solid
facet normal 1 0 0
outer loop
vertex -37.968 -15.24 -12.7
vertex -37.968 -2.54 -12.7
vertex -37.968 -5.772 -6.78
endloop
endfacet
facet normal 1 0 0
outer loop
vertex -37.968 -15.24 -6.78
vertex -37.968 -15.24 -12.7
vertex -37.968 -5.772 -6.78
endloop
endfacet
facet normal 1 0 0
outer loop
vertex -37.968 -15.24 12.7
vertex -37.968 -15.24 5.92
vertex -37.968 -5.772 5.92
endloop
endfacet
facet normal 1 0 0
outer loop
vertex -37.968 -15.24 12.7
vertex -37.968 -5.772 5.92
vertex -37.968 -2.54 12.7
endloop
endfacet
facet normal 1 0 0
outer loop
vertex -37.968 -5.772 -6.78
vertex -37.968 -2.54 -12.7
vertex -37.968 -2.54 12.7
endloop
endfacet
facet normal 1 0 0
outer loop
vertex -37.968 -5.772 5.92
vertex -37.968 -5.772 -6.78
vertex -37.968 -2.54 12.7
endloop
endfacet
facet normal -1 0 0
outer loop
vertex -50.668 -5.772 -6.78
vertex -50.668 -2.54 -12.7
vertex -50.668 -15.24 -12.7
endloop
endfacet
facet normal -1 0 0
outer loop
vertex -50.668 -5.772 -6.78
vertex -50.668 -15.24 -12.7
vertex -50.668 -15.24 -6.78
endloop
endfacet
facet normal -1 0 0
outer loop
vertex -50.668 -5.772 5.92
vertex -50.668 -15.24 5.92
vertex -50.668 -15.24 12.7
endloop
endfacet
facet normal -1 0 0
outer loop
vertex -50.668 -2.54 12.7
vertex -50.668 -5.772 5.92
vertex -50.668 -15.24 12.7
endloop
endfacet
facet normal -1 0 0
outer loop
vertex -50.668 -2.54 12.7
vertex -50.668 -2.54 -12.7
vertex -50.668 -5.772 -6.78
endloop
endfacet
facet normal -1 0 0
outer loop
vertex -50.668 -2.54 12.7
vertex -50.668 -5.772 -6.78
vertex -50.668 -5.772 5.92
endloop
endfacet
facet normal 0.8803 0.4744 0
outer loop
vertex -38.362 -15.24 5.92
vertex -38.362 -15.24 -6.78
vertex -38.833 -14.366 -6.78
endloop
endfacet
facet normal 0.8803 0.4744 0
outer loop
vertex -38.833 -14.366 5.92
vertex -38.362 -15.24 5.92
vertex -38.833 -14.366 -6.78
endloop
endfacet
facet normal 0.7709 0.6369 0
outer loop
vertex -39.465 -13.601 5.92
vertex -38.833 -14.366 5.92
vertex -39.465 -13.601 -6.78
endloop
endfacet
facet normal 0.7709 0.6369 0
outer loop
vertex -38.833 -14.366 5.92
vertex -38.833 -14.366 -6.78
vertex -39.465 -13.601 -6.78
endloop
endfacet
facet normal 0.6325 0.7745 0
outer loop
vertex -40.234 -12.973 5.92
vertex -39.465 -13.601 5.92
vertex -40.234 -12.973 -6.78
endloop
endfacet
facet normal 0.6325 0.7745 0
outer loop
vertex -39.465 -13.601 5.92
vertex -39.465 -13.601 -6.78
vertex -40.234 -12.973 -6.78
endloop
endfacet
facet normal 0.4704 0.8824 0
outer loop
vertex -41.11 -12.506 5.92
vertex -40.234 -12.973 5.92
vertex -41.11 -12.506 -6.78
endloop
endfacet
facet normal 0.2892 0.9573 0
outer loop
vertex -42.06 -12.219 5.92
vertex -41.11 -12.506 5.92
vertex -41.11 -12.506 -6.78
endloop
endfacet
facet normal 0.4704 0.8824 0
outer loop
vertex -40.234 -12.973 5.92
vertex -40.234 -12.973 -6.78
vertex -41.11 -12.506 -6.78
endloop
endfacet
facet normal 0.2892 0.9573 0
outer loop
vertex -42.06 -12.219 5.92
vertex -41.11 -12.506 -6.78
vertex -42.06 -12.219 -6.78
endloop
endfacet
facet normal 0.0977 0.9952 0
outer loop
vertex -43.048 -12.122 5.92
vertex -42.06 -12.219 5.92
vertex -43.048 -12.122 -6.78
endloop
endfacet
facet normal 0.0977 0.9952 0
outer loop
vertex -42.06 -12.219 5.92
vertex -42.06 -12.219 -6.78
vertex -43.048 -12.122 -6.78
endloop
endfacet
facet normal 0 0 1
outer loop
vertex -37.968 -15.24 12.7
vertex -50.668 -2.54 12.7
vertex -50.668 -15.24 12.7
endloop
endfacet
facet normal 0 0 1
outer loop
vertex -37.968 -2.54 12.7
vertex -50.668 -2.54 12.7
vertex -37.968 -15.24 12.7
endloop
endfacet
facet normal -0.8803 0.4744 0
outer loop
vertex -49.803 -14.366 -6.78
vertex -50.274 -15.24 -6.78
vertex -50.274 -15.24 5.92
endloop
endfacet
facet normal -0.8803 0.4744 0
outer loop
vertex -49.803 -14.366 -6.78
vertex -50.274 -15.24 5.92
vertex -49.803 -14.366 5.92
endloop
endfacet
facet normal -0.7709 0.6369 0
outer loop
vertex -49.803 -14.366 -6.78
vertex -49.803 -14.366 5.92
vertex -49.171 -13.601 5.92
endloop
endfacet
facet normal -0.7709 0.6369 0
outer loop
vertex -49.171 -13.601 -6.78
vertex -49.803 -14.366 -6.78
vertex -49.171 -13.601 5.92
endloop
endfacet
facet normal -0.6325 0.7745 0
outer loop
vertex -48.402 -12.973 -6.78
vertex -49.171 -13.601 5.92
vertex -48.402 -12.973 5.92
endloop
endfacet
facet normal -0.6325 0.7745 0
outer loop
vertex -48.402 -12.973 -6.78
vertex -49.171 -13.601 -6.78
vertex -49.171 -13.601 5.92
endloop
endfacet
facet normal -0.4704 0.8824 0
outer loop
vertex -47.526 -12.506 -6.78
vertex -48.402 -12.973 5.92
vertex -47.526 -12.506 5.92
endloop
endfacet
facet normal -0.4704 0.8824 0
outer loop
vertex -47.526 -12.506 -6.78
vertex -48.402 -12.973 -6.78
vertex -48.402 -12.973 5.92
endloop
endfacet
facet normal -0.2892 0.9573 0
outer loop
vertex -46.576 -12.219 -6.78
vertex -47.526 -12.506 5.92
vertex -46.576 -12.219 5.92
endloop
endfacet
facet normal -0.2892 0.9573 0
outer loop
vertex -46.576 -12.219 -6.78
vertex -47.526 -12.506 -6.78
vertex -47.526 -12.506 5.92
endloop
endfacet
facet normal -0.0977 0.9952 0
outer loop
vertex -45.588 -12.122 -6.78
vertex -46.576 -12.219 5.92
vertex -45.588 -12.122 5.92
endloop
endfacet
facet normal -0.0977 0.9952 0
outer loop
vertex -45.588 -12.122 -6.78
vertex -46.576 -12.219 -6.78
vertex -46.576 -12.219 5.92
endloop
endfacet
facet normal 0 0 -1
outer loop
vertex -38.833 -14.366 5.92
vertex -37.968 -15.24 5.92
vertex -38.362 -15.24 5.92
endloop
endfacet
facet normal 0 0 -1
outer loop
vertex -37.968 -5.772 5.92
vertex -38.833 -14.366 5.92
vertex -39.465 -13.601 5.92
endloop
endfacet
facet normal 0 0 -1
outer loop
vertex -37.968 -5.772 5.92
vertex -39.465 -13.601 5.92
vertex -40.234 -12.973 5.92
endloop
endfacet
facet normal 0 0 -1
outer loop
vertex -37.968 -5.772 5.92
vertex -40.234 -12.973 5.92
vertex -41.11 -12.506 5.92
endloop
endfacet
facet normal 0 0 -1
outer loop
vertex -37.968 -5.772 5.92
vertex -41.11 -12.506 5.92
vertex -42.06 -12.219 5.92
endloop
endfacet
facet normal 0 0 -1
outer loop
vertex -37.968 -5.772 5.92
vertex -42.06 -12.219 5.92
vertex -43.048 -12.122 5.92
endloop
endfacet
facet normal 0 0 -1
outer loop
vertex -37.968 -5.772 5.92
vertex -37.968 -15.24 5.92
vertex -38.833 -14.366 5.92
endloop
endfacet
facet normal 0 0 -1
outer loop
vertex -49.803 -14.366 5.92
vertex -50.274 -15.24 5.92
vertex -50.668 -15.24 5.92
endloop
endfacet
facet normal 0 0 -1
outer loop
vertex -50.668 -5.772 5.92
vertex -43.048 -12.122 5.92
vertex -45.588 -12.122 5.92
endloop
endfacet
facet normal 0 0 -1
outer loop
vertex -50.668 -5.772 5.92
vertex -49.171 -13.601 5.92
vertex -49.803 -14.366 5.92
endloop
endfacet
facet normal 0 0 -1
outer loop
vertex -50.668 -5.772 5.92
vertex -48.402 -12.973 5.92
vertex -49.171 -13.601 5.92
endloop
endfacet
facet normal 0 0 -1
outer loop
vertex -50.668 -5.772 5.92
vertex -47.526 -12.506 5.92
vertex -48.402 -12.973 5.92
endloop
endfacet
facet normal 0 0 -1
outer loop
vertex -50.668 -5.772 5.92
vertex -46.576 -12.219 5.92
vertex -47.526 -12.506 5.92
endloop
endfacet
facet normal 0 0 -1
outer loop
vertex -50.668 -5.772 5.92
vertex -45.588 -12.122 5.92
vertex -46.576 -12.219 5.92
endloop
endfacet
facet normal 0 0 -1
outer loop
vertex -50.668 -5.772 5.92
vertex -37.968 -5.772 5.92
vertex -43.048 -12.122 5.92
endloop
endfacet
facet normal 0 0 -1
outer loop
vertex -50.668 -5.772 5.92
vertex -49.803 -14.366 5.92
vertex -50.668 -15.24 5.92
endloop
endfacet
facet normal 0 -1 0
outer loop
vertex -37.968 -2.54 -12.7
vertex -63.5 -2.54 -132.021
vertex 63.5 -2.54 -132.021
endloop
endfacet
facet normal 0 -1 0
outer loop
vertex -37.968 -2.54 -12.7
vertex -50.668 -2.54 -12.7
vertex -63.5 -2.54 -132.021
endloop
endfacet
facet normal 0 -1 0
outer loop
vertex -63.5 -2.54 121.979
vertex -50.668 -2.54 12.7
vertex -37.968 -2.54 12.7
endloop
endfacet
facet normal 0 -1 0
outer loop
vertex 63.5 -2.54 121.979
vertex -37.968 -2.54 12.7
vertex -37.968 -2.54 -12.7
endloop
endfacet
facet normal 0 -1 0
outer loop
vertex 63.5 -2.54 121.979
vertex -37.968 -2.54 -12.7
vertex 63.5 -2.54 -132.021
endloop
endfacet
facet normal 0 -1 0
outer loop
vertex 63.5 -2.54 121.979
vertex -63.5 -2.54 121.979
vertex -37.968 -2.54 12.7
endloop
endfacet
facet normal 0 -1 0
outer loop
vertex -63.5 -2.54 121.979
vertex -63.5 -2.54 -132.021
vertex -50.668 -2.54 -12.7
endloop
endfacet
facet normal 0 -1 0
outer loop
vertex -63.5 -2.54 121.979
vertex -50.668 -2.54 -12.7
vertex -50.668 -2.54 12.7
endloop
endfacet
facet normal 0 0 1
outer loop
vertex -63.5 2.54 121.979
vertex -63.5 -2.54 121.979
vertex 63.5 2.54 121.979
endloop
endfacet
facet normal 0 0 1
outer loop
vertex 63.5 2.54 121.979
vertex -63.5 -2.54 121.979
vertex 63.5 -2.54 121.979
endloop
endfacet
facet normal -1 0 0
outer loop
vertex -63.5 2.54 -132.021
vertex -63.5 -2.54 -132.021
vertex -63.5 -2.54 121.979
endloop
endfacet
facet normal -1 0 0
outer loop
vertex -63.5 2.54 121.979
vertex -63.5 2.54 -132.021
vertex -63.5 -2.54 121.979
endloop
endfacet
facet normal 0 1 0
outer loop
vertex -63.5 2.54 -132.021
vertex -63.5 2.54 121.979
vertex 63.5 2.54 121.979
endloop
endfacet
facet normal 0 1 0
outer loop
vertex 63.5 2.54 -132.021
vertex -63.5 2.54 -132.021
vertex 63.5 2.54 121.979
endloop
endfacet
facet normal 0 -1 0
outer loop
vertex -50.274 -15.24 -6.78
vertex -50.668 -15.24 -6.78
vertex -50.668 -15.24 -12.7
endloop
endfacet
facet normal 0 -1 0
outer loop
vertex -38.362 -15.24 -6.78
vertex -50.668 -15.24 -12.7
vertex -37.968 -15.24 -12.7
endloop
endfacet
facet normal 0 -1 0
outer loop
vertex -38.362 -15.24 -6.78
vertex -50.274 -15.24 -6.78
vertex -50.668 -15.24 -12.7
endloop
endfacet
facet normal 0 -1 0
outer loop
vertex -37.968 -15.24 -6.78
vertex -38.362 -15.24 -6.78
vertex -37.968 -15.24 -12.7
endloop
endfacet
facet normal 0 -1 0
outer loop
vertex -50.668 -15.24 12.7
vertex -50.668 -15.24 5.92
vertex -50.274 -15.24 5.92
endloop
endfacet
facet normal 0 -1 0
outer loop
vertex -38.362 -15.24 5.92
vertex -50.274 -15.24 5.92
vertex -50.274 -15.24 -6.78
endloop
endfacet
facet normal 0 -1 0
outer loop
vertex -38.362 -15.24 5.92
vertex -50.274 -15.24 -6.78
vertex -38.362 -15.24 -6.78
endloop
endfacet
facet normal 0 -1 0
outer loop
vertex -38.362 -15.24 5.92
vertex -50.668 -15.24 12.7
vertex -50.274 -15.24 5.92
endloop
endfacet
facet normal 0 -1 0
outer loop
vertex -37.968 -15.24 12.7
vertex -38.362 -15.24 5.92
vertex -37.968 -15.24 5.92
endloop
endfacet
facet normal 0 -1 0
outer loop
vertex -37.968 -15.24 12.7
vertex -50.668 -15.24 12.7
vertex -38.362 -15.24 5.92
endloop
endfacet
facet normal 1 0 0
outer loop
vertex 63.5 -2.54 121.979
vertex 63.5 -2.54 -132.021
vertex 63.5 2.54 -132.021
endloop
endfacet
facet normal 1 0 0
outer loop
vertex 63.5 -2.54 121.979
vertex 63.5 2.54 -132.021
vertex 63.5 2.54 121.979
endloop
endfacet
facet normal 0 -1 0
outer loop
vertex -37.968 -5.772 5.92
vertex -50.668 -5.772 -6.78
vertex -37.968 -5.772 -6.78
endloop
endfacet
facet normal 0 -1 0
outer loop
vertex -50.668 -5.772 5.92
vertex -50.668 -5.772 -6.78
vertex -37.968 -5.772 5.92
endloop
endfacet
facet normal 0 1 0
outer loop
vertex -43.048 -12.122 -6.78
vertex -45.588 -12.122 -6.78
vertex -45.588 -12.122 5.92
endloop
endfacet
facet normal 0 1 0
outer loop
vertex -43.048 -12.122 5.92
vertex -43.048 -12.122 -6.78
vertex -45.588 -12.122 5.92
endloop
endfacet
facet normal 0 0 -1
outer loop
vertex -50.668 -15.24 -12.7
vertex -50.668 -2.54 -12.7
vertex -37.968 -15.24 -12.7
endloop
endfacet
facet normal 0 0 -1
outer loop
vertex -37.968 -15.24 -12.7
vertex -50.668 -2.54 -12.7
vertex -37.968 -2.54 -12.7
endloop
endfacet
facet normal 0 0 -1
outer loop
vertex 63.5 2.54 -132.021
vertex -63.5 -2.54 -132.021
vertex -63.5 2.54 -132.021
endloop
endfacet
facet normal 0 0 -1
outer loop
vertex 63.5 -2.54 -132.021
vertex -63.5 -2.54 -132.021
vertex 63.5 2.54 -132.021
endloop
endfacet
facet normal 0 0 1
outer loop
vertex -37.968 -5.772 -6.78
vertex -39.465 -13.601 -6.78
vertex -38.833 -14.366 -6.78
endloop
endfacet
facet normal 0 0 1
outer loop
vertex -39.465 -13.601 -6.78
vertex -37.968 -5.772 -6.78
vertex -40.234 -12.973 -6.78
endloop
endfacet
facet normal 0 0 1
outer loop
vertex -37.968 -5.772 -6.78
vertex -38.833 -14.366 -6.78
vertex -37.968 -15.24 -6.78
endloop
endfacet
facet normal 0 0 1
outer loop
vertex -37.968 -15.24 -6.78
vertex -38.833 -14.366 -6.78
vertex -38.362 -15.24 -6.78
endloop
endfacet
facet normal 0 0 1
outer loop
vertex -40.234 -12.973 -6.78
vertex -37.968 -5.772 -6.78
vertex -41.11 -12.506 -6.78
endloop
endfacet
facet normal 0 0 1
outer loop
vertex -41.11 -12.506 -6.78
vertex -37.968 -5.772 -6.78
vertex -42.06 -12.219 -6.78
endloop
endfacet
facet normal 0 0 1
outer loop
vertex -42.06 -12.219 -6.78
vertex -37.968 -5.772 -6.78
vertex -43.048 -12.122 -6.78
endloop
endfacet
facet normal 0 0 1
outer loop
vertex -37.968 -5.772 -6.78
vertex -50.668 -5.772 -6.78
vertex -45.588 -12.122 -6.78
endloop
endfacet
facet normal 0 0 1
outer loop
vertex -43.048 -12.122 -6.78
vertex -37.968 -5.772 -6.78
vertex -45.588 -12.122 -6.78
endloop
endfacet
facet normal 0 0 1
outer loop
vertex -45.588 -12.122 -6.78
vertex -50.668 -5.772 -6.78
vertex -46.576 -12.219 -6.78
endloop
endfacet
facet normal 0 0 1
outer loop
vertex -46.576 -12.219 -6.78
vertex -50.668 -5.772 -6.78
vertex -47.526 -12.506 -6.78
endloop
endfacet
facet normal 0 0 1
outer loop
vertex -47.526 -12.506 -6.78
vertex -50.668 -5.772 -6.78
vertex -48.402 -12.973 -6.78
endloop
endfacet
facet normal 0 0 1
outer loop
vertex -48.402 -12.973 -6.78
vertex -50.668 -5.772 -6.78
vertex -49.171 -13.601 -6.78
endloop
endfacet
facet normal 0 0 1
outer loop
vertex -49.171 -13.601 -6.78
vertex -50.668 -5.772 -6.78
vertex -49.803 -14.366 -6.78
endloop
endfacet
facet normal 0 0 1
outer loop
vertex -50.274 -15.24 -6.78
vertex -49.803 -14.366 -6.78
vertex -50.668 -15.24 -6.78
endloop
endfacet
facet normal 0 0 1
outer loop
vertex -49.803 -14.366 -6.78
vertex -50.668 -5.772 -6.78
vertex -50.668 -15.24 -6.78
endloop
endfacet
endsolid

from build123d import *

# Parameters (mm, degrees)
F0_W        = 127
F0_H        = 254
F1_DEPTH    = 2.54
F2_W        = 12.7
F2_H        = 25.4
F3_DEPTH    = 12.7
F4_W        = 6.35
F4_H        = 12.7
F5_DEPTH    = 25.4
F6_T1_DEPTH = 12.7


# Not quite as in the source:
# - a fillet or chamfer that OpenCascade refuses, or shapes differently, is made with other operations: its cross-section is extruded or revolved along the edge and cut away or added


with BuildPart() as f1:
    # F0 (on Front) → F1 (new body, symmetric)
    with BuildSketch(Plane.XZ):
        with Locations((0, -5.0209306781)):
            Rectangle(F0_W, F0_H)
    extrude(amount=F1_DEPTH, both=True)

    # F2 (on face) → F3 (join)
    with BuildSketch(Plane.XZ.offset(2.54)):
        with Locations((-44.3181917071, 0)):
            Rectangle(F2_W, F2_H)
    extrude(amount=F3_DEPTH)

    # F4 (on face) → F5 (cut)
    with BuildSketch(Plane(origin=(-50.6681917071, 0, 0), x_dir=(0, -1, 0), z_dir=(-1, 0, 0))):
        with Locations((8.9468448423, -0.4299022911)):
            Rectangle(F4_W, F4_H)
    extrude(amount=-F5_DEPTH, mode=Mode.SUBTRACT)

    # F6: fillet of radius 5.08 on 2 edges, made by hand

    # F6_s2 → F6_t1 (cut)
    with BuildSketch(Plane.XY.offset(-6.7799022911)):
        with BuildLine():
            ThreePointArc((-50.6681917071, -17.2018448423), (-49.1802941556, -13.6097423939), (-45.5881917071, -12.1218448423))
            Line((-45.5881917071, -12.1218448423), (-50.6681917071, -12.1218448423))
            Line((-50.6681917071, -12.1218448423), (-50.6681917071, -17.2018448423))
        make_face()
        with BuildLine():
            ThreePointArc((-37.9681917071, -17.2018448423), (-39.4560892587, -13.6097423939), (-43.0481917071, -12.1218448423))
            Line((-43.0481917071, -12.1218448423), (-37.9681917071, -12.1218448423))
            Line((-37.9681917071, -12.1218448423), (-37.9681917071, -17.2018448423))
        make_face()
    extrude(amount=F6_T1_DEPTH, mode=Mode.SUBTRACT)


solid = f1.part
